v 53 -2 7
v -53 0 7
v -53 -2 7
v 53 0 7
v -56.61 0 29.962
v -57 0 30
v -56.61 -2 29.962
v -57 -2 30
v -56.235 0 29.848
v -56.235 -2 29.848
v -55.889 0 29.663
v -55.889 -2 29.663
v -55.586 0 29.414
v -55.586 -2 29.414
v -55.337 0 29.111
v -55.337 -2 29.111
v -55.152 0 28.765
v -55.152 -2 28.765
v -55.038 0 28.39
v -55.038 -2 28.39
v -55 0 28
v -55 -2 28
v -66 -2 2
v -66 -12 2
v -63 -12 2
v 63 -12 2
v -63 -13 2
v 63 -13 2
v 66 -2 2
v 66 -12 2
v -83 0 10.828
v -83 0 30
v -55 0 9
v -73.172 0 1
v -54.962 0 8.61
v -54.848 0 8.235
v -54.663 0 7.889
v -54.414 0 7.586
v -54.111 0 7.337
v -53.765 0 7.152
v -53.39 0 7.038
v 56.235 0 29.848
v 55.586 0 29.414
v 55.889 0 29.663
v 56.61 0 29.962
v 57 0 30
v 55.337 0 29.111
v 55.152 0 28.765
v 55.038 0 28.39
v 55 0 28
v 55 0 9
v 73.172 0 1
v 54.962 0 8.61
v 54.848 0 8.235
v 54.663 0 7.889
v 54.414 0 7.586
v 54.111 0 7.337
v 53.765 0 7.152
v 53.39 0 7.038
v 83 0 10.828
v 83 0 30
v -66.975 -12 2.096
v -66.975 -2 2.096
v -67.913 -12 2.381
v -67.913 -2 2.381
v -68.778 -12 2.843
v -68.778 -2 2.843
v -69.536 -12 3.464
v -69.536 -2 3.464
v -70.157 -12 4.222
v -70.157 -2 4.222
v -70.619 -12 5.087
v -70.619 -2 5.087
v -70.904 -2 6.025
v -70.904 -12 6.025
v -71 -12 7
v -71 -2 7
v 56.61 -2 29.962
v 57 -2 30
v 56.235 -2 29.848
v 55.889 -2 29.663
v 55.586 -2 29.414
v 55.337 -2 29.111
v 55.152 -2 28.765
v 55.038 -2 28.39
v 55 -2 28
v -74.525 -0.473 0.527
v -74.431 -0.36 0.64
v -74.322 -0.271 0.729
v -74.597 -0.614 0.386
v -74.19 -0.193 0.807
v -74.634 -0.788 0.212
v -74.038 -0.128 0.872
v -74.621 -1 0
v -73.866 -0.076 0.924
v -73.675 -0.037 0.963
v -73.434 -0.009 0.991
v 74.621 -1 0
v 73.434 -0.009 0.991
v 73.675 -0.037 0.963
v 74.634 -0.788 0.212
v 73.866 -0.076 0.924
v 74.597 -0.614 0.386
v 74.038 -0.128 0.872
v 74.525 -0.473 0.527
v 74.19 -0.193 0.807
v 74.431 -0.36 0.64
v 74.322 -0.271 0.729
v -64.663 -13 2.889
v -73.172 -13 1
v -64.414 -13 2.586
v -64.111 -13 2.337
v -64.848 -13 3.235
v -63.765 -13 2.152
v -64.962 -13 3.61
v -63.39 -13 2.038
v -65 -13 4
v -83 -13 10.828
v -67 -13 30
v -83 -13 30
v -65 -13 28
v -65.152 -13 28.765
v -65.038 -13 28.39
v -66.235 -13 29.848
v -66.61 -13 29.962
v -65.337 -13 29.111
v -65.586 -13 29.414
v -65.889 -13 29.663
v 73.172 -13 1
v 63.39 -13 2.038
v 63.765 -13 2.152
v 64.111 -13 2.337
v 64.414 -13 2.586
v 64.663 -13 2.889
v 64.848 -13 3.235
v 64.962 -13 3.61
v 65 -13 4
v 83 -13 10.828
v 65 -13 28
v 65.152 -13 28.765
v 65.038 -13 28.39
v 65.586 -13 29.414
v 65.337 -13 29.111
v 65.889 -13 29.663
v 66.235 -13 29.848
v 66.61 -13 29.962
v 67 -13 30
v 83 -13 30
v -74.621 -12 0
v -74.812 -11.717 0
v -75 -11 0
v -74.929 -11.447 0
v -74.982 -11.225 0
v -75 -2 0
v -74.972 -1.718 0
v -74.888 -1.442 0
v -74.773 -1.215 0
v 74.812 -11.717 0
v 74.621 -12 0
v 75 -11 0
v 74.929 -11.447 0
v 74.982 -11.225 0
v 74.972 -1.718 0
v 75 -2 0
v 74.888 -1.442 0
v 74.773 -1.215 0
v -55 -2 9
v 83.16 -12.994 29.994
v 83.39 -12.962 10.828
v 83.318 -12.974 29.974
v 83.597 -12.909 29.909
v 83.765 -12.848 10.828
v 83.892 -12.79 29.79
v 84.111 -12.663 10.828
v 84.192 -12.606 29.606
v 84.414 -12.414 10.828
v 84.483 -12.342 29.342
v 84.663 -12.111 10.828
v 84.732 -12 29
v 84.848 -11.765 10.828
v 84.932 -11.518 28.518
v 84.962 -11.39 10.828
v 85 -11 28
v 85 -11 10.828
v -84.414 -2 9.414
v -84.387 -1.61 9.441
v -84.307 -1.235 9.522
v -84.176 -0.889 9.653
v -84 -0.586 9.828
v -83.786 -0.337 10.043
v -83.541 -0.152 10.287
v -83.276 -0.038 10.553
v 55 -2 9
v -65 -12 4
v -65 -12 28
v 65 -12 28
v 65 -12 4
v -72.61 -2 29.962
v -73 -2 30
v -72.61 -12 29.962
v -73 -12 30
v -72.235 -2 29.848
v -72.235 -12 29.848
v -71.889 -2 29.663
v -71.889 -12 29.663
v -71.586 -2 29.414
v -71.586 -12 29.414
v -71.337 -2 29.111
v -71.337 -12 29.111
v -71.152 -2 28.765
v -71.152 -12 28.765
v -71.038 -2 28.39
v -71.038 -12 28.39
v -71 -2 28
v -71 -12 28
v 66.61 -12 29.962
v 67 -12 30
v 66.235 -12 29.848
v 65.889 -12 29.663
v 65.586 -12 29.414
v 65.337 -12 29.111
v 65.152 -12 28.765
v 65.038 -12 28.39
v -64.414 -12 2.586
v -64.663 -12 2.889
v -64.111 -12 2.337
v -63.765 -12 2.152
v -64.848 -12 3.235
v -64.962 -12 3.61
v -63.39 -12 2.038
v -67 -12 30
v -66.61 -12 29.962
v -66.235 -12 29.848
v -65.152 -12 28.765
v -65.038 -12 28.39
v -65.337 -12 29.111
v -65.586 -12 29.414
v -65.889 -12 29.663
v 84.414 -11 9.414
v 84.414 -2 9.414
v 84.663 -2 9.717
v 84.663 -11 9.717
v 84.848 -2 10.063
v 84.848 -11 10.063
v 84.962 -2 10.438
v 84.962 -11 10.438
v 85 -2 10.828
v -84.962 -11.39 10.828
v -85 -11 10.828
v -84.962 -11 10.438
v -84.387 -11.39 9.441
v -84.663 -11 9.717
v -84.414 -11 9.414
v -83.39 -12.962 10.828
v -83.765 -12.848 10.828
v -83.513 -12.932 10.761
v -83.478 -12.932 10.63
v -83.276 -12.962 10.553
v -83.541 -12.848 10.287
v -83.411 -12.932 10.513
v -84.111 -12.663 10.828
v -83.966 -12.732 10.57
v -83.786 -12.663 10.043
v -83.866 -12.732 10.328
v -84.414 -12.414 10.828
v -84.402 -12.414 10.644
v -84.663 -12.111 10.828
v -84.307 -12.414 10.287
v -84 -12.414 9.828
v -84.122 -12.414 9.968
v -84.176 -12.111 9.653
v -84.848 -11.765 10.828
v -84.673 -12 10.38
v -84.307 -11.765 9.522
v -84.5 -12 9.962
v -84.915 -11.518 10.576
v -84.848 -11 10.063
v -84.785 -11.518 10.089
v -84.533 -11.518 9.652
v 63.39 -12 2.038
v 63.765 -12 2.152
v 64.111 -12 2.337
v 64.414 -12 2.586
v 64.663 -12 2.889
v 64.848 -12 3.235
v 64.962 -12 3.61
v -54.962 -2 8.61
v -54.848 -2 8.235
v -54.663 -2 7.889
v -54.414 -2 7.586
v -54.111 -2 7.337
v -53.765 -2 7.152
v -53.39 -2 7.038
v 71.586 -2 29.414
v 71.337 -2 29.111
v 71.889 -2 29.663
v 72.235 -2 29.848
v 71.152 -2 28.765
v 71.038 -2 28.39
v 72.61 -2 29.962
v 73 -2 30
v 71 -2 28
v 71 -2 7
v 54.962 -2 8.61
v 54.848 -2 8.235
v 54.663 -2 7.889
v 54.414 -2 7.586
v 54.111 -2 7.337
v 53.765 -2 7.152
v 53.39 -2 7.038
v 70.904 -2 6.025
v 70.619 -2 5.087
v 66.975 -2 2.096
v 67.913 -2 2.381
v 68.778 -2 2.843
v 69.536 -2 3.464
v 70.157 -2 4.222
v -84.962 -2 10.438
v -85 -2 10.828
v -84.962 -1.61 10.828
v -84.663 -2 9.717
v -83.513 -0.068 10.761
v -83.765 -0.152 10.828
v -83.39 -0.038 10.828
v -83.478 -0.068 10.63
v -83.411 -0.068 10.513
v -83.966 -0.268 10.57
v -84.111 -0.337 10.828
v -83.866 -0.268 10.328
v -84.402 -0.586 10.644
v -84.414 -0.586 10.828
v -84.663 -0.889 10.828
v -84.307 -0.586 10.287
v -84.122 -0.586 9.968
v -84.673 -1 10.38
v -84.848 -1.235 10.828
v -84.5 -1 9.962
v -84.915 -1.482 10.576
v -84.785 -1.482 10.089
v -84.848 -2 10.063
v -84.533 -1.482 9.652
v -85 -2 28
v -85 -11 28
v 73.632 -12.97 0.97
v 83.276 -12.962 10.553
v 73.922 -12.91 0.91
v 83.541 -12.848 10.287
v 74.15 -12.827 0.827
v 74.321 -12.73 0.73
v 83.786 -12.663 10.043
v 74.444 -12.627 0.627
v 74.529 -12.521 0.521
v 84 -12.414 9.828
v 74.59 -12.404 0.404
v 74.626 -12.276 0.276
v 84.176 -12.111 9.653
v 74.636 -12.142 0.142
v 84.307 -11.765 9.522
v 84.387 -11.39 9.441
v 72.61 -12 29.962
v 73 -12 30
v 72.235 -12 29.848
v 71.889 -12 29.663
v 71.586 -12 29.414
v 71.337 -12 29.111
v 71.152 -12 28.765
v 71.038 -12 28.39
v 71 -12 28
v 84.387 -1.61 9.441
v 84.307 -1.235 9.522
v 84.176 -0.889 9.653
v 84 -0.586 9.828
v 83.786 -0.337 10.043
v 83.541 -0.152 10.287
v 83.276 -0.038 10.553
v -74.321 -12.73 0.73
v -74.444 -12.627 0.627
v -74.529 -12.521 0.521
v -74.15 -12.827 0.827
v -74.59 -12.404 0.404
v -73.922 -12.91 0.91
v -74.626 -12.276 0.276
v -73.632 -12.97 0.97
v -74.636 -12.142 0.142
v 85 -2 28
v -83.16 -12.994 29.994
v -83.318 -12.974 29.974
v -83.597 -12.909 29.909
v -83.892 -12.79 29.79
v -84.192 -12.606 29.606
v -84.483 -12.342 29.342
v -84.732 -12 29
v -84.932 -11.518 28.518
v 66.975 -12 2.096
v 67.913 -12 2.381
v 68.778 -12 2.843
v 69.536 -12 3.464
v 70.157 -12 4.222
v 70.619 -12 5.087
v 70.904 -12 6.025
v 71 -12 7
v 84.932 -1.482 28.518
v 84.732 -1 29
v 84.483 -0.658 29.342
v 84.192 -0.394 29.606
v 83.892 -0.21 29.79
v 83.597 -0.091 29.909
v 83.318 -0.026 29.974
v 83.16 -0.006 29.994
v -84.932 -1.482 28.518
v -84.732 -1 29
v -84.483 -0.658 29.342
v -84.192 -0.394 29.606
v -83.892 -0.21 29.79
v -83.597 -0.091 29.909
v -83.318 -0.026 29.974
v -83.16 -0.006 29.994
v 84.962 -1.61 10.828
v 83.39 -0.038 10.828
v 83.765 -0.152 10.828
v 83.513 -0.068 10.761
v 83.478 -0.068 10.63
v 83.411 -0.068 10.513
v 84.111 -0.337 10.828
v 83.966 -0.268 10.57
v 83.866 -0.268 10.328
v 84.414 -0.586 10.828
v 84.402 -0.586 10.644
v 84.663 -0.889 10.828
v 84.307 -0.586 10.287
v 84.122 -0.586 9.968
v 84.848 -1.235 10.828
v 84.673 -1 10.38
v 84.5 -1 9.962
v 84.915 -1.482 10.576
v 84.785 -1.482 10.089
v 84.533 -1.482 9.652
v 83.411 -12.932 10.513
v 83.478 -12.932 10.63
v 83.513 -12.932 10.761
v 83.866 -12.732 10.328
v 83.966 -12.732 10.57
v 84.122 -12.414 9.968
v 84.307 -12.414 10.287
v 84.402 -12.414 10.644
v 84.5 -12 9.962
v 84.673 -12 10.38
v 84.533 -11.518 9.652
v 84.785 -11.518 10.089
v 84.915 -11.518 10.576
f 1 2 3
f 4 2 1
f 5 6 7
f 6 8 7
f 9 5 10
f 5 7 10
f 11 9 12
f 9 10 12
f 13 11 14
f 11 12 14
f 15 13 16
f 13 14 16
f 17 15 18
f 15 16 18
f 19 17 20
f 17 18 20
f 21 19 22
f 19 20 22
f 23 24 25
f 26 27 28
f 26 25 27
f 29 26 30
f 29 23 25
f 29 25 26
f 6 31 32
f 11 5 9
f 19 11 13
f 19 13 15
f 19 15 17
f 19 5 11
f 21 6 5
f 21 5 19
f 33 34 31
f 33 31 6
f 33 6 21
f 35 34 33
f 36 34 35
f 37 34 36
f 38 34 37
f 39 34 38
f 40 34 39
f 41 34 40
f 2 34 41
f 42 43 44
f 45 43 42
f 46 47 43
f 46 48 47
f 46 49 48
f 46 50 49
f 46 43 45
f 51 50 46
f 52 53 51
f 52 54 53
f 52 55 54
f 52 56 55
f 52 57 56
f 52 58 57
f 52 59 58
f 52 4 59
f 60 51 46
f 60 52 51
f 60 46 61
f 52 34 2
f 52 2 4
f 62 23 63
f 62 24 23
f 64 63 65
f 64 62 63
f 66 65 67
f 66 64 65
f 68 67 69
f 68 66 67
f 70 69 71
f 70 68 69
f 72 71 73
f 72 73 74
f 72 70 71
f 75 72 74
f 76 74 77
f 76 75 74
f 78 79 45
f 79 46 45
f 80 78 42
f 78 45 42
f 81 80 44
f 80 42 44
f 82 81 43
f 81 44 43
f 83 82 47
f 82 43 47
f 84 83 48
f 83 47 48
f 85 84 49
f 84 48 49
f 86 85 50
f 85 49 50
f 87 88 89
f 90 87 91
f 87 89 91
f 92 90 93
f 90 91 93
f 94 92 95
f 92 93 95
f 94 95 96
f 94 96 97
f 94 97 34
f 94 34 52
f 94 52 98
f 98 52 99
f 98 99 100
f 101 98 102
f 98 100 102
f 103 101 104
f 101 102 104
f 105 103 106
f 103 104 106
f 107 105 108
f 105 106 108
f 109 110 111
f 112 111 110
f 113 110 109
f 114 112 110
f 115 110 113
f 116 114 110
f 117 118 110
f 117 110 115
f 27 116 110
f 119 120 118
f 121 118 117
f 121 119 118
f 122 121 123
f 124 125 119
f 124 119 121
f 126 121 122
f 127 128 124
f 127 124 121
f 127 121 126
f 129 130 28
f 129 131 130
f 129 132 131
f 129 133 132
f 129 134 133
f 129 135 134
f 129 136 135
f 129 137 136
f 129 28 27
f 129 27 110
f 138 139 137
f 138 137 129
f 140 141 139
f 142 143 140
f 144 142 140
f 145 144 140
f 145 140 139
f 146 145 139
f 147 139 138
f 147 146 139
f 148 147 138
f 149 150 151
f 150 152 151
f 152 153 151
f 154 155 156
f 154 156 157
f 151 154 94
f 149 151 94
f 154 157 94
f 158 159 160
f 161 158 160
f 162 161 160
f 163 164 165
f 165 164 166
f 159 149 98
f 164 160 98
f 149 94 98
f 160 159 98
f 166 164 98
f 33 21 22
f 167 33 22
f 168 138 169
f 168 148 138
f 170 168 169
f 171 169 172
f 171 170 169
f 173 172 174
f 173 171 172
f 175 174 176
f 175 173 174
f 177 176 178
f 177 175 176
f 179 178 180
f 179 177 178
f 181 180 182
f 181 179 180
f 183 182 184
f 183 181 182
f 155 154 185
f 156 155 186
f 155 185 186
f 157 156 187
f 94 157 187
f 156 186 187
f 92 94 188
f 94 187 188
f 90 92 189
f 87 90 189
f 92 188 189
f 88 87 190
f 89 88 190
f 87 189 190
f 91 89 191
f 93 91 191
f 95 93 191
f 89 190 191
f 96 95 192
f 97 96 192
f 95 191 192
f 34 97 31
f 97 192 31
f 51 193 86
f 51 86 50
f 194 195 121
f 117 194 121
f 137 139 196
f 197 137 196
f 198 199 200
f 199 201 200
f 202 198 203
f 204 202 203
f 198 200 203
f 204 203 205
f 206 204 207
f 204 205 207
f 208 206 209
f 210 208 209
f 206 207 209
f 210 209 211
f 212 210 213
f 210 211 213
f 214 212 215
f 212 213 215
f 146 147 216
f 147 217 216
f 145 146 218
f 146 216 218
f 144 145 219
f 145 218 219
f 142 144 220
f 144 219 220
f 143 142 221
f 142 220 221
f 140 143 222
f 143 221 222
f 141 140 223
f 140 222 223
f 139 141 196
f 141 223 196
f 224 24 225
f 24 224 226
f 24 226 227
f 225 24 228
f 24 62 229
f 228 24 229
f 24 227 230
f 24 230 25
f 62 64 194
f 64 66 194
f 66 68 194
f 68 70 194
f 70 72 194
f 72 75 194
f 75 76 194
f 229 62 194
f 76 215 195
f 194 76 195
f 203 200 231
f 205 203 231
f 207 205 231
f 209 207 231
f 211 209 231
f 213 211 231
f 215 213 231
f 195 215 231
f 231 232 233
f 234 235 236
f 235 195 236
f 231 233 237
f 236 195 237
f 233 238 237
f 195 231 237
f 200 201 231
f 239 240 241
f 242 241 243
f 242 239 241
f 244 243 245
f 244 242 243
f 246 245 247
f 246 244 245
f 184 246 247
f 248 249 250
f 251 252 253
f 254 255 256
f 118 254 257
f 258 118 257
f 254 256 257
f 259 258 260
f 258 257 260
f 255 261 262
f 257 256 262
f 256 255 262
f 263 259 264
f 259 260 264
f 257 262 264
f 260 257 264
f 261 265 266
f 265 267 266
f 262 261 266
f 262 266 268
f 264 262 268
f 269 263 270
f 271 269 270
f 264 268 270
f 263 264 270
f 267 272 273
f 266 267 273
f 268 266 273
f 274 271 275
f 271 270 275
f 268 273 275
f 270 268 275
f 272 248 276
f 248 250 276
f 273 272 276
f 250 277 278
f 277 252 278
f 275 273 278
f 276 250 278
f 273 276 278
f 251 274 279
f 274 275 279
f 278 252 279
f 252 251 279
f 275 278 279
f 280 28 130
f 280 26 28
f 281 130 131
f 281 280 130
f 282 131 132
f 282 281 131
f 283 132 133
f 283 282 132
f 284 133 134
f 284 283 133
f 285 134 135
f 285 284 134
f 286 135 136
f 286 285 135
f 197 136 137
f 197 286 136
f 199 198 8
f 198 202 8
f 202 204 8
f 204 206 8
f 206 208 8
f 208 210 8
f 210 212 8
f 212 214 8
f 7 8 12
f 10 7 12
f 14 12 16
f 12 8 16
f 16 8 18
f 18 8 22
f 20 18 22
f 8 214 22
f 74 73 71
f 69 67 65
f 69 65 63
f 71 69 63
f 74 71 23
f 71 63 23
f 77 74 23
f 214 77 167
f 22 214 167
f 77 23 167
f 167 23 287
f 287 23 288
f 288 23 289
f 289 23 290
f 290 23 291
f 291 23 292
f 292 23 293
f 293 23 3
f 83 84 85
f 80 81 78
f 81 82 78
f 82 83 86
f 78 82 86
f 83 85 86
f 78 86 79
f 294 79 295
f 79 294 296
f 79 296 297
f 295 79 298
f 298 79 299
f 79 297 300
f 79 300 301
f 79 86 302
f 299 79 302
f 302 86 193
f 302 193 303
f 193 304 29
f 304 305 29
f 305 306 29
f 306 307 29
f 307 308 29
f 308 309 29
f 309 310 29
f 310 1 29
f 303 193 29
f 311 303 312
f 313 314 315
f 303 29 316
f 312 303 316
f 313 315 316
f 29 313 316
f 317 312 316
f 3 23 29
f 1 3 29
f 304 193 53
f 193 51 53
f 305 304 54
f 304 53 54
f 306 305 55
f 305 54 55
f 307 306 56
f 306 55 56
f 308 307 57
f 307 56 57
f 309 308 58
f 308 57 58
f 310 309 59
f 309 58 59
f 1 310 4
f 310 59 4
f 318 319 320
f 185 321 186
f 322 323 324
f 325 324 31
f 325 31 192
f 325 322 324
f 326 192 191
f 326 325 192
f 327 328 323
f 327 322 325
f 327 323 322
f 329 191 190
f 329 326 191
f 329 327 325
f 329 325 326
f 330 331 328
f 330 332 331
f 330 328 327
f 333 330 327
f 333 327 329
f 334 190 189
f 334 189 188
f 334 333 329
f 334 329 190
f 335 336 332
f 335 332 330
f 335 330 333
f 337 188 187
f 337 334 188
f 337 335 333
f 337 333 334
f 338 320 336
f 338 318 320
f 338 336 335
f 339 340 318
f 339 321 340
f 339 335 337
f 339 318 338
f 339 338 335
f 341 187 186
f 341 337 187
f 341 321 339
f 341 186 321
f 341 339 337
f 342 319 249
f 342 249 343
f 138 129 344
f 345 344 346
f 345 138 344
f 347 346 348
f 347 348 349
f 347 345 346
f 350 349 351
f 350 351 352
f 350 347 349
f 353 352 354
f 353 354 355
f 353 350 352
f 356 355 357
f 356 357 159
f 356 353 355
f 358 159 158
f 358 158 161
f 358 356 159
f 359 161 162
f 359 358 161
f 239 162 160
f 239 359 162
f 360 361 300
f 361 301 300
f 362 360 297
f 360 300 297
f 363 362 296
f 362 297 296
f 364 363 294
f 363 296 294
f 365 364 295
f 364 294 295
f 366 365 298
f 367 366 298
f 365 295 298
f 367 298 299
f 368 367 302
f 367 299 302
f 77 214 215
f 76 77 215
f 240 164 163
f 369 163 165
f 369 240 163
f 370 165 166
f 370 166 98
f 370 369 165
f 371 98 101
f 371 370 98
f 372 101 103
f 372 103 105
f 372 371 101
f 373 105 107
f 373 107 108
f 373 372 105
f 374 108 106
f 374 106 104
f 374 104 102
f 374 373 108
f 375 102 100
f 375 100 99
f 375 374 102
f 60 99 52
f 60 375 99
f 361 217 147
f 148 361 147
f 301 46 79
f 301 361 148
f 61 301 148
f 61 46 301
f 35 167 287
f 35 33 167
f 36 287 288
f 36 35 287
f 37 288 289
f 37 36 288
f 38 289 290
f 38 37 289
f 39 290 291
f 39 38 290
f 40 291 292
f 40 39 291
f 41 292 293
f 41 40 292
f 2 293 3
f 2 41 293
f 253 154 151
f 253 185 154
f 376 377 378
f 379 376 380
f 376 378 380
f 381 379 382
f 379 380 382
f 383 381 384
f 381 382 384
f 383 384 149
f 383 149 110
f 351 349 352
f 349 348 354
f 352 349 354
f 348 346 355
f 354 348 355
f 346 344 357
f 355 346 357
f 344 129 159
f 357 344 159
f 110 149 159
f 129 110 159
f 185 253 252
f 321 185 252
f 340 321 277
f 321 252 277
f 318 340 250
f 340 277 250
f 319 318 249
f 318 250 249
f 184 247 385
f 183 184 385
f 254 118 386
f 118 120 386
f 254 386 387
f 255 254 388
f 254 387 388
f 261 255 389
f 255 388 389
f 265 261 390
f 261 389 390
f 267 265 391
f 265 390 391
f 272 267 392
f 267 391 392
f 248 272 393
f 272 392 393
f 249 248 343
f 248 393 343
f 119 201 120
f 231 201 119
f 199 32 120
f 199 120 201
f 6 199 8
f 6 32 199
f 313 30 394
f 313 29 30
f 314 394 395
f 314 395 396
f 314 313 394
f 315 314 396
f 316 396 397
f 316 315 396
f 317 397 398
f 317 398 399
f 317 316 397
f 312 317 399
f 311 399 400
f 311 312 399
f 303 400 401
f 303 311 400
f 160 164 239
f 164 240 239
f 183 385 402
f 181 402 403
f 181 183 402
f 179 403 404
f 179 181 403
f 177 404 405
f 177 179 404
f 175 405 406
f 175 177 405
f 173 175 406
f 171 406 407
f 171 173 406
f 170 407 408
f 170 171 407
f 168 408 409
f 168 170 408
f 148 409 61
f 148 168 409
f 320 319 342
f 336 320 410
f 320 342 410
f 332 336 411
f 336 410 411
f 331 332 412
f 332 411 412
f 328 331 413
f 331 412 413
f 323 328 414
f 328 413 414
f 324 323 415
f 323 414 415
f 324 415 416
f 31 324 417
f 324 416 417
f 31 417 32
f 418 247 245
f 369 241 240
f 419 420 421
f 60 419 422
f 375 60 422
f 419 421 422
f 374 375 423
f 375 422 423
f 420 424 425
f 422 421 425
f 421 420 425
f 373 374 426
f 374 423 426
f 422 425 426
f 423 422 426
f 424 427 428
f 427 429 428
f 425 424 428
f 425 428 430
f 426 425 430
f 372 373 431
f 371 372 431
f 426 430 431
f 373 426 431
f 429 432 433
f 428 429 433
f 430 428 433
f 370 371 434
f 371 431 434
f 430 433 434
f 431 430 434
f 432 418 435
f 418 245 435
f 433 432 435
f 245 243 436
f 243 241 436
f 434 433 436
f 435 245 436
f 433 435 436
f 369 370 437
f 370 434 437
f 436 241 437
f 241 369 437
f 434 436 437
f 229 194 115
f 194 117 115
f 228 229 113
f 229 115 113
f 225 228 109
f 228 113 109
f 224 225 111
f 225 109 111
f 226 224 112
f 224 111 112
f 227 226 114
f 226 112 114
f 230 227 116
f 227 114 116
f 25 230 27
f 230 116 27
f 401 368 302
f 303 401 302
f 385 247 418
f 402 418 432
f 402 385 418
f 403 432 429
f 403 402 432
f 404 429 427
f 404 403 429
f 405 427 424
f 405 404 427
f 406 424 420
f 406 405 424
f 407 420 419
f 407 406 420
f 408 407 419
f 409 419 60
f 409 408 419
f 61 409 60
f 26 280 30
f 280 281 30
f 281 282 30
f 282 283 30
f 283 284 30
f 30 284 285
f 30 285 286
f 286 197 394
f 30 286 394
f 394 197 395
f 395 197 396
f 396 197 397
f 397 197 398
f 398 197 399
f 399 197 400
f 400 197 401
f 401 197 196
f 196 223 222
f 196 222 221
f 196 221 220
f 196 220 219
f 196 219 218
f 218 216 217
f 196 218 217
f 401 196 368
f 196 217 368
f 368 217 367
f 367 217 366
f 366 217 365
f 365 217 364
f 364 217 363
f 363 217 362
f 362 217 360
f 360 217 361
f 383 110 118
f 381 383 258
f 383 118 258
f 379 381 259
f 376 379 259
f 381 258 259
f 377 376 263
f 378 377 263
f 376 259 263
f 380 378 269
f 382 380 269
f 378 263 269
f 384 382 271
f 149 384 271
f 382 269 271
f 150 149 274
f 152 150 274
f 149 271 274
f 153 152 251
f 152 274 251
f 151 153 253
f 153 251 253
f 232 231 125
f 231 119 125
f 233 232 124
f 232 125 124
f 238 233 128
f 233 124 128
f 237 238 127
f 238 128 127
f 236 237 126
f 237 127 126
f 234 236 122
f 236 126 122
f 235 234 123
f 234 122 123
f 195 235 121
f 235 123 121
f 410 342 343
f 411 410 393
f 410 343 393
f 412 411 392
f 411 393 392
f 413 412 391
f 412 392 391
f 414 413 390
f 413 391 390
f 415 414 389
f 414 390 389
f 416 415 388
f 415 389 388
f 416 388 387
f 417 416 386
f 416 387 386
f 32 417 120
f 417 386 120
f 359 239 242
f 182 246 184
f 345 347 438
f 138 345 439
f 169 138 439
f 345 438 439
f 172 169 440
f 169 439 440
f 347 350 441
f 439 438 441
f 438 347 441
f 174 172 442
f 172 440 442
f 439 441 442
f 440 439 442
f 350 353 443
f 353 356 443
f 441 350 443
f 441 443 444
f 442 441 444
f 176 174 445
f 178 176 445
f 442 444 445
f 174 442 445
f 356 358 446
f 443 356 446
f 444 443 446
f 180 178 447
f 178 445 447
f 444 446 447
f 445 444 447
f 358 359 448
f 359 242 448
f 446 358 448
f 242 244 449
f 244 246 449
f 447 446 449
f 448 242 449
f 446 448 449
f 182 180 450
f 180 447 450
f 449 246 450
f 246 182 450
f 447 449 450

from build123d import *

# Parameters (mm, degrees)
F0_W     = 170
F0_H     = 30
F1_DEPTH = 13
F3_DEPTH = 28
F4_W     = 110
F4_H     = 2
F5_DEPTH = 5
F6_SIZE  = 10
F7_R     = 5
F8_SIZE  = 1
F9_R     = 2


with BuildPart() as f1:
    # F0 (on Front) → F1 (new body)
    with BuildSketch(Plane.XZ):
        with Locations((0, 15)):
            Rectangle(F0_W, F0_H)
    extrude(amount=F1_DEPTH)

    # F2 (on face) → F3 (cut)
    with BuildSketch(Plane.XY.offset(30)):
        Polygon((-55, -2), (-71, -2), (-71, -12), (-65, -12), (-65, -13), (65, -13), (65, -12), (71, -12), (71, -2), (55, -2), (55, 0), (-55, 0), align=None)
    extrude(amount=-F3_DEPTH, mode=Mode.SUBTRACT)

    # F4 (on face) → F5 (join)
    with BuildSketch(Plane.XY.offset(2)):
        with Locations((0, -1)):
            Rectangle(F4_W, F4_H)
    extrude(amount=F5_DEPTH)

    # F6
    f6_edges = [f1.edges().sort_by_distance(p)[0] for p in [
        (85, -6.5, 0),
        (-85, -6.5, 0),
    ]]
    chamfer(f6_edges, length=F6_SIZE)

    # F7
    f7_edges = [f1.edges().sort_by_distance(p)[0] for p in [
        (-71, -7, 2),
        (71, -7, 2),
    ]]
    fillet(f7_edges, radius=F7_R)

    # F8
    f8_edges = [f1.edges().sort_by_distance(p)[0] for p in [
        (0, -13, 0),
        (0, 0, 0),
    ]]
    chamfer(f8_edges, length=F8_SIZE)

    # F9
    f9_edges = [f1.edges().sort_by_distance(p)[0] for p in [
        (-85, -6.5, 10),
        (-85, -6.5, 30),
        (-71, -7, 30),
        (71, -7, 30),
        (85, -6.5, 30),
        (85, -6.5, 10),
        (55, -1, 7),
        (55, -1, 30),
        (65, -12.5, 2),
        (65, -12.5, 30),
        (-55, -1, 30),
        (-55, -1, 7),
        (-65, -12.5, 2),
        (-65, -12.5, 30),
        (85, 0, 20),
        (80.5, 0, 5.5),
        (80.5, -13, 5.5),
        (85, -13, 20),
        (-85, 0, 20),
        (-80.5, 0, 5.5),
        (-85, -13, 20),
        (-80.5, -13, 5.5),
    ]]
    fillet(f9_edges, radius=F9_R)


solid = f1.part
